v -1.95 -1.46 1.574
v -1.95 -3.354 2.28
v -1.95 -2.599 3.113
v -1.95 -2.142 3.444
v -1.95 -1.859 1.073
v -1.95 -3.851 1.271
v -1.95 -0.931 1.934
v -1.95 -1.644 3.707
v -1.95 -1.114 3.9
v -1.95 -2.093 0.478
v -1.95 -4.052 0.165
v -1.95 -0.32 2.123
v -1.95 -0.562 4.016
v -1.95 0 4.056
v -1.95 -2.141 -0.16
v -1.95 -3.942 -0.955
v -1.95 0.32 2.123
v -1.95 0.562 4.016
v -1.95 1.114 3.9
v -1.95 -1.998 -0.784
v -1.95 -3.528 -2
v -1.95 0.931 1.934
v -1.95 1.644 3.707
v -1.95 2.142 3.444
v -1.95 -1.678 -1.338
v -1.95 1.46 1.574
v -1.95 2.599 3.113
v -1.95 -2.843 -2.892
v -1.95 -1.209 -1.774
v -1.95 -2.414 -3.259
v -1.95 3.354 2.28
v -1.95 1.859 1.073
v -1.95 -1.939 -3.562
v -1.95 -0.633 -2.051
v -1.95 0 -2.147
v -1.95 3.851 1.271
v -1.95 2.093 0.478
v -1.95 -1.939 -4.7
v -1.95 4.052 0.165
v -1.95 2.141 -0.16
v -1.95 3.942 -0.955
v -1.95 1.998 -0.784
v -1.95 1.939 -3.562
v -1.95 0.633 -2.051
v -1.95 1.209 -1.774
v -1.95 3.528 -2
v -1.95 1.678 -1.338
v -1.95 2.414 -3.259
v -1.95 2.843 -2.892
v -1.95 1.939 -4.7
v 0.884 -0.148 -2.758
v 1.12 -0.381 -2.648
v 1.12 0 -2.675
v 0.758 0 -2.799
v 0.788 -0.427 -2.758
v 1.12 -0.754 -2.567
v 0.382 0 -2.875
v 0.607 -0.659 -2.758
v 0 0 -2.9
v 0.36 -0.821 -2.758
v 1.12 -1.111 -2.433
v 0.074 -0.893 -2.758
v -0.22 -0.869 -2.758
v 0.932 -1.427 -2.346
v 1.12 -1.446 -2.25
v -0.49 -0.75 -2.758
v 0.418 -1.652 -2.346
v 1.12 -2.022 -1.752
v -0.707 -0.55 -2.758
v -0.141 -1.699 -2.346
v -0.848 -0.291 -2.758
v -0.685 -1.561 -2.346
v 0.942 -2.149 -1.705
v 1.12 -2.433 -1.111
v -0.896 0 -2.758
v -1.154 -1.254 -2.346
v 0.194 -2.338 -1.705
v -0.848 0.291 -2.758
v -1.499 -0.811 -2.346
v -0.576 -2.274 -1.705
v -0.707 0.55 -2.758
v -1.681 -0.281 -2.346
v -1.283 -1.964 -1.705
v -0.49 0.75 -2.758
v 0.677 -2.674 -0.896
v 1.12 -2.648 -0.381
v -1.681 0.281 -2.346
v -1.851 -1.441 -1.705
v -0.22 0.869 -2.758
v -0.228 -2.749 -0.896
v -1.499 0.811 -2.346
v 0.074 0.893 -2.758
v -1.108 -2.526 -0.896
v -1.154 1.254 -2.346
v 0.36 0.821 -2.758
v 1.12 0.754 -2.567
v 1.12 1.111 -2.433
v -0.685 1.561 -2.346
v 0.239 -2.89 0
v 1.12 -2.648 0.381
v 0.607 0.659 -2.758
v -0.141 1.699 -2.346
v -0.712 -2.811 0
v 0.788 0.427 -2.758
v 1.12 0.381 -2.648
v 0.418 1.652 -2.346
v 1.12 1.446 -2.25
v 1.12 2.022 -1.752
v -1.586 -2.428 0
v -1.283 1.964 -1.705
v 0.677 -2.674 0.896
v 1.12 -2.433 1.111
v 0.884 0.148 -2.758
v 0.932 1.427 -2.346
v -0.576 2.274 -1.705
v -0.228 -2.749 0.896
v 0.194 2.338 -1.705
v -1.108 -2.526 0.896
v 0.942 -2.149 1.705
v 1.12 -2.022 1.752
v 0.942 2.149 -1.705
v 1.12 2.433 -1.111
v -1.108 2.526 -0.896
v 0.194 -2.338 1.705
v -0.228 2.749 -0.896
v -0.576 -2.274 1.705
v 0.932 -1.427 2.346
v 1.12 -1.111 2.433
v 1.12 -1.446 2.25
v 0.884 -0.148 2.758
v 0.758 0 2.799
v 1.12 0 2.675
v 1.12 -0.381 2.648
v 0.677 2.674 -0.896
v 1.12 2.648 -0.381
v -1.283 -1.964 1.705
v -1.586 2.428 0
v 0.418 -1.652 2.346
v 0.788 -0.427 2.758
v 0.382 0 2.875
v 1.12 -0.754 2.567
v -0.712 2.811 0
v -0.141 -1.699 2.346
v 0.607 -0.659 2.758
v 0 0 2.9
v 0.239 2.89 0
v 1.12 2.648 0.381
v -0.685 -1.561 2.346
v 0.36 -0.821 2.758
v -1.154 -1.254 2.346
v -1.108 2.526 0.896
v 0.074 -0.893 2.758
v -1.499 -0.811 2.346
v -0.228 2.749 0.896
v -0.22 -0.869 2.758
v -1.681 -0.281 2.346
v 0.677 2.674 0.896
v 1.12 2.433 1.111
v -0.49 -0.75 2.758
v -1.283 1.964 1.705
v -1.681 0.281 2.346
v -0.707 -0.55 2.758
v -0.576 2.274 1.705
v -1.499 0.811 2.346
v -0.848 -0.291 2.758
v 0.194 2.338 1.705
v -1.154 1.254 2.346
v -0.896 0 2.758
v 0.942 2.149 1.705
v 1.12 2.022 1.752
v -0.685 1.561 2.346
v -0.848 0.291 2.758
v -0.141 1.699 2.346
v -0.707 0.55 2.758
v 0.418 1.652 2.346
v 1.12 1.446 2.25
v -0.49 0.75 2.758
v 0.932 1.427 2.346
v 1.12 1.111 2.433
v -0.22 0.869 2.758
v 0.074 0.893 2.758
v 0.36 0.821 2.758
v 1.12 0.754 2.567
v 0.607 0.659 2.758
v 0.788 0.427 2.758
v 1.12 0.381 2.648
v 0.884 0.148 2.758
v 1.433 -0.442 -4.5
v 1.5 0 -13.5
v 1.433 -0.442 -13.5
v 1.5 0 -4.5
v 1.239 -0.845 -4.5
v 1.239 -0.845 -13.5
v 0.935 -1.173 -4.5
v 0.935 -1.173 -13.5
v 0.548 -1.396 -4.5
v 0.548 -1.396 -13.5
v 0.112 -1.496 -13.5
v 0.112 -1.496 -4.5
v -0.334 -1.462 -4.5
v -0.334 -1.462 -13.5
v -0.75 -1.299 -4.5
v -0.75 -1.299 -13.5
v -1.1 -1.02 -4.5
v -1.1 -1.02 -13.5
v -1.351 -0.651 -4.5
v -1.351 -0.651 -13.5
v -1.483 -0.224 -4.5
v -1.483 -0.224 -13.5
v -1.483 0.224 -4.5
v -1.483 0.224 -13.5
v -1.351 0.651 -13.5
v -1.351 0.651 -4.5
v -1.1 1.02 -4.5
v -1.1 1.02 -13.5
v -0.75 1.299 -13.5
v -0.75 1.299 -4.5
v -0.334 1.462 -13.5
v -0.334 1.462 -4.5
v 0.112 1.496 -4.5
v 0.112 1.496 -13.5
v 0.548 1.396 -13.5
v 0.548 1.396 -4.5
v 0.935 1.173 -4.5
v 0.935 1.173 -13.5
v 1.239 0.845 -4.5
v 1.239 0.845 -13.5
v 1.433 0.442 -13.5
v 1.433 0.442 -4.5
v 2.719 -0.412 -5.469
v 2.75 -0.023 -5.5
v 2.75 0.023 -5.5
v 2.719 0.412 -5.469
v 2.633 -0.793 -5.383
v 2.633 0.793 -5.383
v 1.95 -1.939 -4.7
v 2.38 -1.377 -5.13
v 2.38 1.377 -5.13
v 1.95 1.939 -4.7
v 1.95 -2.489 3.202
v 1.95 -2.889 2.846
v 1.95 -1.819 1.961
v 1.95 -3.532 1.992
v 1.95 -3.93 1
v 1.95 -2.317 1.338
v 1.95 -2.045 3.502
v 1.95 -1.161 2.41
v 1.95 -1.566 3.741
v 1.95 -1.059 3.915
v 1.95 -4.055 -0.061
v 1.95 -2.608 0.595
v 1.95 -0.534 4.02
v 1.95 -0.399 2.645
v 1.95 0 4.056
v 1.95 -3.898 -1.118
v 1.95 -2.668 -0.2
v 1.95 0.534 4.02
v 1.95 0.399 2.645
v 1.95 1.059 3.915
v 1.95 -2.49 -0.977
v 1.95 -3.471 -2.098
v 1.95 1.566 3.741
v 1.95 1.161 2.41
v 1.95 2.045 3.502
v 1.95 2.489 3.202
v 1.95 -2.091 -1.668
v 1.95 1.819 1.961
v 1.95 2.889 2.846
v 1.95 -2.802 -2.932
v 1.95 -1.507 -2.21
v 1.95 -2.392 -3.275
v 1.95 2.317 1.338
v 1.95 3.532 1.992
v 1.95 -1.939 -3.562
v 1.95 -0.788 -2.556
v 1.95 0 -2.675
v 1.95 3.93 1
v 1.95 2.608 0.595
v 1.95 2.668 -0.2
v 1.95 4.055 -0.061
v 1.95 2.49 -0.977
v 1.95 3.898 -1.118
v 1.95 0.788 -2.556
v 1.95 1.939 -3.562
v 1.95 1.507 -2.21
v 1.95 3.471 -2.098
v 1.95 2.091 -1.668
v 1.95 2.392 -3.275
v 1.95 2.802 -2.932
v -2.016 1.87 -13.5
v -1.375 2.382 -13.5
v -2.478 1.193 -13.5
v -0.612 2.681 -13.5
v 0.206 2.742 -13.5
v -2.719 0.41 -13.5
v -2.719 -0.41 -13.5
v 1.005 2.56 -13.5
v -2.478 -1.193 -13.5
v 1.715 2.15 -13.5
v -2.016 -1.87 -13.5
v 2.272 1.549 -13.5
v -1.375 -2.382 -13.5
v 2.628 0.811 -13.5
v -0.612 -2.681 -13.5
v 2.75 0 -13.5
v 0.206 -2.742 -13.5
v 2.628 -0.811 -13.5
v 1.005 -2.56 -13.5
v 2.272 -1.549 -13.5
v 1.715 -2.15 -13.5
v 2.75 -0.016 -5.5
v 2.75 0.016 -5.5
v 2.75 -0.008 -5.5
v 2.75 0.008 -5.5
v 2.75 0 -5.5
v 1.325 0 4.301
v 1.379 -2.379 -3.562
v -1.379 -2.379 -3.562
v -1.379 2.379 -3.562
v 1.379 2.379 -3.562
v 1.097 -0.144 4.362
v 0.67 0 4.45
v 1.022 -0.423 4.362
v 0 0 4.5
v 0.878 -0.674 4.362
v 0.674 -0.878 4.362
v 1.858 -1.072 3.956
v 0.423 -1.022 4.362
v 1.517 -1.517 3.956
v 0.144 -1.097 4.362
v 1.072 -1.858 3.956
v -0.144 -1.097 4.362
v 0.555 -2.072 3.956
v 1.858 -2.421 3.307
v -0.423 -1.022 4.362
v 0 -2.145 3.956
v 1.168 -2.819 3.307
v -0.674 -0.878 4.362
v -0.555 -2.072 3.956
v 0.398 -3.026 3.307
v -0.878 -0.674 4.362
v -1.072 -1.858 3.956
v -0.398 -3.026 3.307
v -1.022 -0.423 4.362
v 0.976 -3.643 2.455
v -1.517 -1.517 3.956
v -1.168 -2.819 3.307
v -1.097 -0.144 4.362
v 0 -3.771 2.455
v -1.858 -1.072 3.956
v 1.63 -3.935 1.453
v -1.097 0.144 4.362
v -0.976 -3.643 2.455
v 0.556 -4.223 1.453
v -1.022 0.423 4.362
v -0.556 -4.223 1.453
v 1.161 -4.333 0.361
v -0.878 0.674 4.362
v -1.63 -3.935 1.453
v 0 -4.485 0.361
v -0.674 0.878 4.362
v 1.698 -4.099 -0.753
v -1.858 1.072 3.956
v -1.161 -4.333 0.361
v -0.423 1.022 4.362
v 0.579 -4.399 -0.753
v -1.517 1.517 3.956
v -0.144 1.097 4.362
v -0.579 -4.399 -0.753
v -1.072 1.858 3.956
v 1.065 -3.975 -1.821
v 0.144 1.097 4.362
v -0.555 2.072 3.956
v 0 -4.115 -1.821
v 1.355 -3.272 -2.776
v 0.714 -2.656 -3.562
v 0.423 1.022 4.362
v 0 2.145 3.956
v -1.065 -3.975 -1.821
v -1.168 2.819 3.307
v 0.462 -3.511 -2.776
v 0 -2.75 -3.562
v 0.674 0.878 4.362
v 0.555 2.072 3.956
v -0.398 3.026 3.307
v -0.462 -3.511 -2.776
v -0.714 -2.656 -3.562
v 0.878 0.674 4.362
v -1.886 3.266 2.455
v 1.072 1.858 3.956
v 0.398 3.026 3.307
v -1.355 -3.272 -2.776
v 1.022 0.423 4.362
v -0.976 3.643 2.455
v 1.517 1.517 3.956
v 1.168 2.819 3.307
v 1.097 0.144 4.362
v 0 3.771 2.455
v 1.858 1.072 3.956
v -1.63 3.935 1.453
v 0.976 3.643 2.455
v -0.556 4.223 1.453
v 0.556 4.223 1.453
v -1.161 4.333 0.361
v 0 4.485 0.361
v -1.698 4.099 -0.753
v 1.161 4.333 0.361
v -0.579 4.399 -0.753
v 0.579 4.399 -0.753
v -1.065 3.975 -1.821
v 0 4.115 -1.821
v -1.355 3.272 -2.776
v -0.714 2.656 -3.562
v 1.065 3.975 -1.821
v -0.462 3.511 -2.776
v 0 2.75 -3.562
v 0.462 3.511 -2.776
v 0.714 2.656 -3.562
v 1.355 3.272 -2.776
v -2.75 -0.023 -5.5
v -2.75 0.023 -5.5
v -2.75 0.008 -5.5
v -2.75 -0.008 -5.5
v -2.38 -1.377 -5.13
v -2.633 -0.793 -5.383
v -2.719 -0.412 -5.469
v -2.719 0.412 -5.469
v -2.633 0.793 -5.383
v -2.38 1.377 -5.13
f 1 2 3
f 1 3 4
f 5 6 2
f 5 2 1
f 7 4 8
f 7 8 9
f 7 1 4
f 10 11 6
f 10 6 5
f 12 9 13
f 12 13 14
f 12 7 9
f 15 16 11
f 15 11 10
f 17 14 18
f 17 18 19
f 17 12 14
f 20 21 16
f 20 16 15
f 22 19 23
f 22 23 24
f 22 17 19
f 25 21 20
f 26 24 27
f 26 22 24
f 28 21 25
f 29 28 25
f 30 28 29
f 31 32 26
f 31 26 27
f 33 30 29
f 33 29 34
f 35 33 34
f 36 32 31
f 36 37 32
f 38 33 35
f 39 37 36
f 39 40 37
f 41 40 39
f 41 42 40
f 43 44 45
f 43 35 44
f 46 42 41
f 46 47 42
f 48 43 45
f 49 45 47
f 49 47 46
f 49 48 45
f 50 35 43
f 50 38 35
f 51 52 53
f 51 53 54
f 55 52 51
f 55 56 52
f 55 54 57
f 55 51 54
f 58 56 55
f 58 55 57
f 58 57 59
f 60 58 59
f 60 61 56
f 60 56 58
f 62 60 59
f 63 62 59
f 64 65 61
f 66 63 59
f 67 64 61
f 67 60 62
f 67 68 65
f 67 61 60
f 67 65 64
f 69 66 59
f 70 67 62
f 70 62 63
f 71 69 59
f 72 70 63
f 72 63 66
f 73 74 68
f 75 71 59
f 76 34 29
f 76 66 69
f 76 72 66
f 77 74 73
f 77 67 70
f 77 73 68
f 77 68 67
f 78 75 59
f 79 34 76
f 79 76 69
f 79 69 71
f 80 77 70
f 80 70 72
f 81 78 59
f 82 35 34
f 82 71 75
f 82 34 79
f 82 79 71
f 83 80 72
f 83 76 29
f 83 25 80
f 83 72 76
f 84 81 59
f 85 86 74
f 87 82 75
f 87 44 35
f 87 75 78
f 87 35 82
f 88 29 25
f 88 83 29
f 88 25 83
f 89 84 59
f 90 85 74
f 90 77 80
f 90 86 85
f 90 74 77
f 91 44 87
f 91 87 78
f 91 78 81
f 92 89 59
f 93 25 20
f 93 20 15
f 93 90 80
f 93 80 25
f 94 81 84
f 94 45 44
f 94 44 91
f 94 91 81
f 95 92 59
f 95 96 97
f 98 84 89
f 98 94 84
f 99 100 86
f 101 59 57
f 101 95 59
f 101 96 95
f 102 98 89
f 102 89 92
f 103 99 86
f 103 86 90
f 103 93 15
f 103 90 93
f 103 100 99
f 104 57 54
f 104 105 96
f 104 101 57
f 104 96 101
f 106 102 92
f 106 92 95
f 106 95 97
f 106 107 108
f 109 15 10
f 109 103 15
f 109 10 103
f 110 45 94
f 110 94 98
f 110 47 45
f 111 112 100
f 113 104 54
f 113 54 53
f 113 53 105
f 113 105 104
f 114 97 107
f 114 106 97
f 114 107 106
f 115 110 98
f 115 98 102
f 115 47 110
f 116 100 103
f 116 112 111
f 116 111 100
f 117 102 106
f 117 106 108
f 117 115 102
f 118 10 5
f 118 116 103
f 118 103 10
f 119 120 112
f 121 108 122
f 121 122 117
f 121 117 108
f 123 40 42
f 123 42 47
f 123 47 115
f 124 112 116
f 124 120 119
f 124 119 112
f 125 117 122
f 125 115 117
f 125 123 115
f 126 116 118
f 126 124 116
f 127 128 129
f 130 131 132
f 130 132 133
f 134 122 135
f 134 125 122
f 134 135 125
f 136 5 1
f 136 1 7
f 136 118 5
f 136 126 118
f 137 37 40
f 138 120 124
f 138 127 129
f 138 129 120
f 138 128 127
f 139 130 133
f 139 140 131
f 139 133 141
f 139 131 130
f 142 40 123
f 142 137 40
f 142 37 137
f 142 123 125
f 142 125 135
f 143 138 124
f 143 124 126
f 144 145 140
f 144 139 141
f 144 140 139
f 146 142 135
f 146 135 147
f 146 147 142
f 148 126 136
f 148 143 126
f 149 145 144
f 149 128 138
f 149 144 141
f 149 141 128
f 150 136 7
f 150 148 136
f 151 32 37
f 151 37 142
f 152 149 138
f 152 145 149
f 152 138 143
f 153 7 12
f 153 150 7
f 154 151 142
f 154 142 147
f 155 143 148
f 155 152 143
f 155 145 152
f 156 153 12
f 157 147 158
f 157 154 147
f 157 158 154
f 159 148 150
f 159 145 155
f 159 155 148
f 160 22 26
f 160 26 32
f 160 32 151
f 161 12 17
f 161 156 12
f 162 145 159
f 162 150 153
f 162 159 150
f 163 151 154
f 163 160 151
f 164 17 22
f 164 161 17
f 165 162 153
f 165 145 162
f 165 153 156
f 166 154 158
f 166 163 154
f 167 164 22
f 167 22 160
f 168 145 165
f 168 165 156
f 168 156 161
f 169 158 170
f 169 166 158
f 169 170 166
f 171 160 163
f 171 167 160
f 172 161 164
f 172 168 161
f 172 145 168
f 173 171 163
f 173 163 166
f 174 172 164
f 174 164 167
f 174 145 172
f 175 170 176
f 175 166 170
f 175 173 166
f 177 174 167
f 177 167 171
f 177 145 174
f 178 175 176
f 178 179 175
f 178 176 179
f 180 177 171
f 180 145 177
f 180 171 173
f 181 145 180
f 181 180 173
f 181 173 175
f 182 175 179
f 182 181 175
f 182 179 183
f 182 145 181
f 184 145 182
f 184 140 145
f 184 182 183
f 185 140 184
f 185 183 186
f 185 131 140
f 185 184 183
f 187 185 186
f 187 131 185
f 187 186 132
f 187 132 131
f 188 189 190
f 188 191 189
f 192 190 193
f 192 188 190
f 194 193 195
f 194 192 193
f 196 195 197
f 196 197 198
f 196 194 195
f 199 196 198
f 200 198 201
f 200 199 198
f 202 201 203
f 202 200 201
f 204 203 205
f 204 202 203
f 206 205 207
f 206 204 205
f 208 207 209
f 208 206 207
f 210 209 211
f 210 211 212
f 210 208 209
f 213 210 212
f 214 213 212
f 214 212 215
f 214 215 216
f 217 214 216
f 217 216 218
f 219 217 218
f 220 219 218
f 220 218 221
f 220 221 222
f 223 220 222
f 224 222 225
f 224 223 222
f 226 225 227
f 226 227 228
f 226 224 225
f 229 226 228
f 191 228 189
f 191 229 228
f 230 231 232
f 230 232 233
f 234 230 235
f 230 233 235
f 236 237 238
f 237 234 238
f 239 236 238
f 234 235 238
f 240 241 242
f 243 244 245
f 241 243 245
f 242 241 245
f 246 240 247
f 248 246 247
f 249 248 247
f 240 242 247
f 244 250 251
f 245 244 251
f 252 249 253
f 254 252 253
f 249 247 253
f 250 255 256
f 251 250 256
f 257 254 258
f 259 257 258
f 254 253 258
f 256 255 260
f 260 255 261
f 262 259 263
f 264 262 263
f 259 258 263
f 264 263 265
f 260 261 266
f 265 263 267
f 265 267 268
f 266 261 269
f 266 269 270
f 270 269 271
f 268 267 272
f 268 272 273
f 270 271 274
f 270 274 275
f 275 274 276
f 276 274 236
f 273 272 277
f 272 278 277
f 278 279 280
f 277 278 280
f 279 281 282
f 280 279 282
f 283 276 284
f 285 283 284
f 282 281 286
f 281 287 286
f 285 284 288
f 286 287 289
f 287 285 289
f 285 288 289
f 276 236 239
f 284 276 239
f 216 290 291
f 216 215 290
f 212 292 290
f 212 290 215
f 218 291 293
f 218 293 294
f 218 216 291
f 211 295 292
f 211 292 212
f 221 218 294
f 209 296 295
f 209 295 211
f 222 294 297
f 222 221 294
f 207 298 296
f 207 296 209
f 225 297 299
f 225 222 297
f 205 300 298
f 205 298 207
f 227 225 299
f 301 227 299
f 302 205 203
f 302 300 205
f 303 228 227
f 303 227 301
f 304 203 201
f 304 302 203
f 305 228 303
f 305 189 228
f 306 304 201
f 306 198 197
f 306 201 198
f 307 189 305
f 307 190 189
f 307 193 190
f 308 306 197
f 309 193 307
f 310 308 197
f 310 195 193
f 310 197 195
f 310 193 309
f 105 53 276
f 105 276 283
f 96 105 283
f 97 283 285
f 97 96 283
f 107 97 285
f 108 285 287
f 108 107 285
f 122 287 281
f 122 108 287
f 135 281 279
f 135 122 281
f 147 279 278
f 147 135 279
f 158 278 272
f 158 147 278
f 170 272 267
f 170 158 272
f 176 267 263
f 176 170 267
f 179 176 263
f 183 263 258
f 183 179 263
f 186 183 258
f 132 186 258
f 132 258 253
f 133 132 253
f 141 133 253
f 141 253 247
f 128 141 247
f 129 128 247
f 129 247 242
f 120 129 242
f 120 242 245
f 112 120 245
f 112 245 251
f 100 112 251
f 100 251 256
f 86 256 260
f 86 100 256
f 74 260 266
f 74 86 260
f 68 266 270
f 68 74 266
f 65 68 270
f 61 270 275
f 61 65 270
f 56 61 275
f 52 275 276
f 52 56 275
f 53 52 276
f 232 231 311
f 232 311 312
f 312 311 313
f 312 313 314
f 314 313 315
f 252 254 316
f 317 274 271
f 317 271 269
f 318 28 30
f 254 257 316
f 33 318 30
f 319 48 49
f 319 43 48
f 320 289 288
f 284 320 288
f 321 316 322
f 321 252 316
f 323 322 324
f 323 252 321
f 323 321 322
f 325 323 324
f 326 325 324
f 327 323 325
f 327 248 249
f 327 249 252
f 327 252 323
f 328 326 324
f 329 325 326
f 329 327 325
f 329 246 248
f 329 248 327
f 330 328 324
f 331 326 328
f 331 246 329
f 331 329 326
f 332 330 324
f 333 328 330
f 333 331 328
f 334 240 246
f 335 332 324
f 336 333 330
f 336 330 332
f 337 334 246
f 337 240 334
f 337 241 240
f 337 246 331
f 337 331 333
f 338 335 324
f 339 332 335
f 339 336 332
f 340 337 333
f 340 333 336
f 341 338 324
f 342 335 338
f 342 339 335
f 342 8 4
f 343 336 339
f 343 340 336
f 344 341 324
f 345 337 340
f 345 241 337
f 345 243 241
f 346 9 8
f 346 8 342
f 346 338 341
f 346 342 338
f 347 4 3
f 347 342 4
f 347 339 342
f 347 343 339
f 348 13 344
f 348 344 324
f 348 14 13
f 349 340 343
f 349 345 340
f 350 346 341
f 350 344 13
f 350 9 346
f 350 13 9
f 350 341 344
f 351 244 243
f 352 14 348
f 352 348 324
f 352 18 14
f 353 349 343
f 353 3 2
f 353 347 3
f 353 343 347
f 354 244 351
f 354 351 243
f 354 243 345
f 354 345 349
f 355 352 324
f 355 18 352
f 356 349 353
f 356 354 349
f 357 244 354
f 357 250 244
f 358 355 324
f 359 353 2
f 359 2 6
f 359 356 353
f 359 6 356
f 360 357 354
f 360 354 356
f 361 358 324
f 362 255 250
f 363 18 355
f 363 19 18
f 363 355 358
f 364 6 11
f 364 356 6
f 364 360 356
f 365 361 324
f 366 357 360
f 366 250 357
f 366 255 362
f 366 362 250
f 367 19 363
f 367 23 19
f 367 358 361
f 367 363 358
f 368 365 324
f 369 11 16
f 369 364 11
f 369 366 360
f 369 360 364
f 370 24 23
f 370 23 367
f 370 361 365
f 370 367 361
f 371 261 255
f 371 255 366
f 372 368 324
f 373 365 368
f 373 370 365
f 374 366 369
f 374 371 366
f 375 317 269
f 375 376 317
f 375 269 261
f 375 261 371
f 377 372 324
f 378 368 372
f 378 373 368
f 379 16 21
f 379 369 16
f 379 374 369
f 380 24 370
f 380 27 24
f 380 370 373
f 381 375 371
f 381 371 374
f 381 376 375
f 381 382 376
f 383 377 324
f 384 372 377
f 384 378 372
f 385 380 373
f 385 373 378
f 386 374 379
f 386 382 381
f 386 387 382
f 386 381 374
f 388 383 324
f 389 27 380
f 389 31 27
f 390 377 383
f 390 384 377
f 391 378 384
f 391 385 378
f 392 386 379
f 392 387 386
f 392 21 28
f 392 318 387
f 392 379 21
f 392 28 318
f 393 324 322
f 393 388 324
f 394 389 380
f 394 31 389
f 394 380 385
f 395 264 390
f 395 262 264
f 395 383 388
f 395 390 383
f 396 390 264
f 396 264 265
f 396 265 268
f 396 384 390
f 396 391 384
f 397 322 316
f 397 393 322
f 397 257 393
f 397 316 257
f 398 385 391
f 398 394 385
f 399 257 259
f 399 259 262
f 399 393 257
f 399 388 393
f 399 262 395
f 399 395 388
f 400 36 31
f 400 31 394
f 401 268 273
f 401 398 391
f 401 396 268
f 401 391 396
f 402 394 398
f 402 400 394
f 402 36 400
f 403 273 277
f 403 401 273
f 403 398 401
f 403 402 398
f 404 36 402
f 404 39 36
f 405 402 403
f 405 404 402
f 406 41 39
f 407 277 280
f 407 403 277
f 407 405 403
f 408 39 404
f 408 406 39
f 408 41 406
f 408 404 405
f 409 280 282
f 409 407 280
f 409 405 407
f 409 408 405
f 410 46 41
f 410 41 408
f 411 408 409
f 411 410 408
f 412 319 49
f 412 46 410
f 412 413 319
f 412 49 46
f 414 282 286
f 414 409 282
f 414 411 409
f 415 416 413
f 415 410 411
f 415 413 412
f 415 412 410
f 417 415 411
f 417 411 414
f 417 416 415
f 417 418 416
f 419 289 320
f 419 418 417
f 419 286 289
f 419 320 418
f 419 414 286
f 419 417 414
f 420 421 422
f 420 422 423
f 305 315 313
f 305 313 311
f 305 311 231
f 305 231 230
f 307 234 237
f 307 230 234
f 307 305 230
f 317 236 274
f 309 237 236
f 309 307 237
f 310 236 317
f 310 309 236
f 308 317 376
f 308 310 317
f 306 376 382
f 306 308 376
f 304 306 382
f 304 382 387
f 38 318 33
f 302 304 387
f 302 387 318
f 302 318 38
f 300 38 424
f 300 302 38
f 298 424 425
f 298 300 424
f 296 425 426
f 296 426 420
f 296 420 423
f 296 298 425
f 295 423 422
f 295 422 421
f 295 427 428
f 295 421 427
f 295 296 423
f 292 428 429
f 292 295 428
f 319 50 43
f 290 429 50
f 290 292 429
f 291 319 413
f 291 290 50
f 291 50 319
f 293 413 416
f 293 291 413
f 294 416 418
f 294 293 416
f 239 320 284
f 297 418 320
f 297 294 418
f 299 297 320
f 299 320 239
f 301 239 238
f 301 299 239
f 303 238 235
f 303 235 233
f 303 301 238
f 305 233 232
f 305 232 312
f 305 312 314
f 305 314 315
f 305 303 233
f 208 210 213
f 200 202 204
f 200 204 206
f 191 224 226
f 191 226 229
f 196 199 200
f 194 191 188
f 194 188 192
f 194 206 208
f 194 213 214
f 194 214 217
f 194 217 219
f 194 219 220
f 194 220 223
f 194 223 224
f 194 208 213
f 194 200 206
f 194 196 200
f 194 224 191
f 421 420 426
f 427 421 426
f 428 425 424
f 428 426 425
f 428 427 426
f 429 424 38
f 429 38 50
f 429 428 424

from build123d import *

# Parameters (mm, degrees)
CUT_EXTRUDE_2_DEPTH      = 5.5
CUT_EXTRUDE_2_DEPTH_BACK = 5.5
SKETCH_2_OUTSIDE_W       = 15.41
SKETCH_2_OUTSIDE_H       = 15.41
SKETCH_2_OUTSIDE_W_2     = 3.9
SKETCH_2_OUTSIDE_H_2     = 10
CHAMFER_2_SIZE           = 0.8
CUT_EXTRUDE_START        = -0.830011261
CUT_EXTRUDE_3_OUTLINE_R  = 2.675
CUT_EXTRUDE_3_DEPTH      = 0.830011261


# Read off the part's stored shape, not the designer's step: Вырез-Вытянуть3
with BuildPart() as part:
    # Эскиз1 → Повернуть1 (revolve)
    with BuildSketch(Plane(origin=(0, 0, 0), x_dir=(1, 0, 0), z_dir=(0, 1, 0))):
        with BuildLine():
            ThreePointArc((0, 2.9), (2.9, 0), (0, -2.9))
            Line((0, -2.9), (0, -4.5))
            ThreePointArc((0, -4.5), (4.259036435, -1.452793395), (2.75, 3.561951712))
            Line((2.75, 3.561951712), (2.75, 13.5))
            Line((2.75, 13.5), (1.5, 13.5))
            Line((1.5, 13.5), (1.5, 4.5))
            Line((1.5, 4.5), (0, 4.5))
            Line((0, 4.5), (0, 2.9))
        make_face()
    revolve(axis=Axis((0, 0, 0), (0, 0, -1)))

    # Эскиз2 outside → Вырез-Вытянуть2 (cut, two sides: drawn at the far end of the back side and taken through both)
    with BuildSketch(Plane.XY.offset(-CUT_EXTRUDE_2_DEPTH_BACK)):
        Rectangle(SKETCH_2_OUTSIDE_W, SKETCH_2_OUTSIDE_H)
        Rectangle(SKETCH_2_OUTSIDE_W_2, SKETCH_2_OUTSIDE_H_2, mode=Mode.SUBTRACT)
    extrude(amount=CUT_EXTRUDE_2_DEPTH + CUT_EXTRUDE_2_DEPTH_BACK, mode=Mode.SUBTRACT)

    # Фаска2
    chamfer_2_edges = [part.edges().sort_by_distance(p)[0] for p in [
        (1.95, 0, -5.5),
        (-1.95, 0, -5.5),
    ]]
    chamfer(chamfer_2_edges, length=CHAMFER_2_SIZE - 0.0001)  # a hair under: the kernel refuses the full size

    # Вырез-Вытянуть3 outline → Вырез-Вытянуть3 (cut)
    with BuildSketch(Plane(origin=(1.95, 0, 0), x_dir=(0, 0, -1), z_dir=(1, 0, 0)).offset(CUT_EXTRUDE_START)):
        Circle(CUT_EXTRUDE_3_OUTLINE_R)
    extrude(amount=CUT_EXTRUDE_3_DEPTH, mode=Mode.SUBTRACT)


solid = part.part
